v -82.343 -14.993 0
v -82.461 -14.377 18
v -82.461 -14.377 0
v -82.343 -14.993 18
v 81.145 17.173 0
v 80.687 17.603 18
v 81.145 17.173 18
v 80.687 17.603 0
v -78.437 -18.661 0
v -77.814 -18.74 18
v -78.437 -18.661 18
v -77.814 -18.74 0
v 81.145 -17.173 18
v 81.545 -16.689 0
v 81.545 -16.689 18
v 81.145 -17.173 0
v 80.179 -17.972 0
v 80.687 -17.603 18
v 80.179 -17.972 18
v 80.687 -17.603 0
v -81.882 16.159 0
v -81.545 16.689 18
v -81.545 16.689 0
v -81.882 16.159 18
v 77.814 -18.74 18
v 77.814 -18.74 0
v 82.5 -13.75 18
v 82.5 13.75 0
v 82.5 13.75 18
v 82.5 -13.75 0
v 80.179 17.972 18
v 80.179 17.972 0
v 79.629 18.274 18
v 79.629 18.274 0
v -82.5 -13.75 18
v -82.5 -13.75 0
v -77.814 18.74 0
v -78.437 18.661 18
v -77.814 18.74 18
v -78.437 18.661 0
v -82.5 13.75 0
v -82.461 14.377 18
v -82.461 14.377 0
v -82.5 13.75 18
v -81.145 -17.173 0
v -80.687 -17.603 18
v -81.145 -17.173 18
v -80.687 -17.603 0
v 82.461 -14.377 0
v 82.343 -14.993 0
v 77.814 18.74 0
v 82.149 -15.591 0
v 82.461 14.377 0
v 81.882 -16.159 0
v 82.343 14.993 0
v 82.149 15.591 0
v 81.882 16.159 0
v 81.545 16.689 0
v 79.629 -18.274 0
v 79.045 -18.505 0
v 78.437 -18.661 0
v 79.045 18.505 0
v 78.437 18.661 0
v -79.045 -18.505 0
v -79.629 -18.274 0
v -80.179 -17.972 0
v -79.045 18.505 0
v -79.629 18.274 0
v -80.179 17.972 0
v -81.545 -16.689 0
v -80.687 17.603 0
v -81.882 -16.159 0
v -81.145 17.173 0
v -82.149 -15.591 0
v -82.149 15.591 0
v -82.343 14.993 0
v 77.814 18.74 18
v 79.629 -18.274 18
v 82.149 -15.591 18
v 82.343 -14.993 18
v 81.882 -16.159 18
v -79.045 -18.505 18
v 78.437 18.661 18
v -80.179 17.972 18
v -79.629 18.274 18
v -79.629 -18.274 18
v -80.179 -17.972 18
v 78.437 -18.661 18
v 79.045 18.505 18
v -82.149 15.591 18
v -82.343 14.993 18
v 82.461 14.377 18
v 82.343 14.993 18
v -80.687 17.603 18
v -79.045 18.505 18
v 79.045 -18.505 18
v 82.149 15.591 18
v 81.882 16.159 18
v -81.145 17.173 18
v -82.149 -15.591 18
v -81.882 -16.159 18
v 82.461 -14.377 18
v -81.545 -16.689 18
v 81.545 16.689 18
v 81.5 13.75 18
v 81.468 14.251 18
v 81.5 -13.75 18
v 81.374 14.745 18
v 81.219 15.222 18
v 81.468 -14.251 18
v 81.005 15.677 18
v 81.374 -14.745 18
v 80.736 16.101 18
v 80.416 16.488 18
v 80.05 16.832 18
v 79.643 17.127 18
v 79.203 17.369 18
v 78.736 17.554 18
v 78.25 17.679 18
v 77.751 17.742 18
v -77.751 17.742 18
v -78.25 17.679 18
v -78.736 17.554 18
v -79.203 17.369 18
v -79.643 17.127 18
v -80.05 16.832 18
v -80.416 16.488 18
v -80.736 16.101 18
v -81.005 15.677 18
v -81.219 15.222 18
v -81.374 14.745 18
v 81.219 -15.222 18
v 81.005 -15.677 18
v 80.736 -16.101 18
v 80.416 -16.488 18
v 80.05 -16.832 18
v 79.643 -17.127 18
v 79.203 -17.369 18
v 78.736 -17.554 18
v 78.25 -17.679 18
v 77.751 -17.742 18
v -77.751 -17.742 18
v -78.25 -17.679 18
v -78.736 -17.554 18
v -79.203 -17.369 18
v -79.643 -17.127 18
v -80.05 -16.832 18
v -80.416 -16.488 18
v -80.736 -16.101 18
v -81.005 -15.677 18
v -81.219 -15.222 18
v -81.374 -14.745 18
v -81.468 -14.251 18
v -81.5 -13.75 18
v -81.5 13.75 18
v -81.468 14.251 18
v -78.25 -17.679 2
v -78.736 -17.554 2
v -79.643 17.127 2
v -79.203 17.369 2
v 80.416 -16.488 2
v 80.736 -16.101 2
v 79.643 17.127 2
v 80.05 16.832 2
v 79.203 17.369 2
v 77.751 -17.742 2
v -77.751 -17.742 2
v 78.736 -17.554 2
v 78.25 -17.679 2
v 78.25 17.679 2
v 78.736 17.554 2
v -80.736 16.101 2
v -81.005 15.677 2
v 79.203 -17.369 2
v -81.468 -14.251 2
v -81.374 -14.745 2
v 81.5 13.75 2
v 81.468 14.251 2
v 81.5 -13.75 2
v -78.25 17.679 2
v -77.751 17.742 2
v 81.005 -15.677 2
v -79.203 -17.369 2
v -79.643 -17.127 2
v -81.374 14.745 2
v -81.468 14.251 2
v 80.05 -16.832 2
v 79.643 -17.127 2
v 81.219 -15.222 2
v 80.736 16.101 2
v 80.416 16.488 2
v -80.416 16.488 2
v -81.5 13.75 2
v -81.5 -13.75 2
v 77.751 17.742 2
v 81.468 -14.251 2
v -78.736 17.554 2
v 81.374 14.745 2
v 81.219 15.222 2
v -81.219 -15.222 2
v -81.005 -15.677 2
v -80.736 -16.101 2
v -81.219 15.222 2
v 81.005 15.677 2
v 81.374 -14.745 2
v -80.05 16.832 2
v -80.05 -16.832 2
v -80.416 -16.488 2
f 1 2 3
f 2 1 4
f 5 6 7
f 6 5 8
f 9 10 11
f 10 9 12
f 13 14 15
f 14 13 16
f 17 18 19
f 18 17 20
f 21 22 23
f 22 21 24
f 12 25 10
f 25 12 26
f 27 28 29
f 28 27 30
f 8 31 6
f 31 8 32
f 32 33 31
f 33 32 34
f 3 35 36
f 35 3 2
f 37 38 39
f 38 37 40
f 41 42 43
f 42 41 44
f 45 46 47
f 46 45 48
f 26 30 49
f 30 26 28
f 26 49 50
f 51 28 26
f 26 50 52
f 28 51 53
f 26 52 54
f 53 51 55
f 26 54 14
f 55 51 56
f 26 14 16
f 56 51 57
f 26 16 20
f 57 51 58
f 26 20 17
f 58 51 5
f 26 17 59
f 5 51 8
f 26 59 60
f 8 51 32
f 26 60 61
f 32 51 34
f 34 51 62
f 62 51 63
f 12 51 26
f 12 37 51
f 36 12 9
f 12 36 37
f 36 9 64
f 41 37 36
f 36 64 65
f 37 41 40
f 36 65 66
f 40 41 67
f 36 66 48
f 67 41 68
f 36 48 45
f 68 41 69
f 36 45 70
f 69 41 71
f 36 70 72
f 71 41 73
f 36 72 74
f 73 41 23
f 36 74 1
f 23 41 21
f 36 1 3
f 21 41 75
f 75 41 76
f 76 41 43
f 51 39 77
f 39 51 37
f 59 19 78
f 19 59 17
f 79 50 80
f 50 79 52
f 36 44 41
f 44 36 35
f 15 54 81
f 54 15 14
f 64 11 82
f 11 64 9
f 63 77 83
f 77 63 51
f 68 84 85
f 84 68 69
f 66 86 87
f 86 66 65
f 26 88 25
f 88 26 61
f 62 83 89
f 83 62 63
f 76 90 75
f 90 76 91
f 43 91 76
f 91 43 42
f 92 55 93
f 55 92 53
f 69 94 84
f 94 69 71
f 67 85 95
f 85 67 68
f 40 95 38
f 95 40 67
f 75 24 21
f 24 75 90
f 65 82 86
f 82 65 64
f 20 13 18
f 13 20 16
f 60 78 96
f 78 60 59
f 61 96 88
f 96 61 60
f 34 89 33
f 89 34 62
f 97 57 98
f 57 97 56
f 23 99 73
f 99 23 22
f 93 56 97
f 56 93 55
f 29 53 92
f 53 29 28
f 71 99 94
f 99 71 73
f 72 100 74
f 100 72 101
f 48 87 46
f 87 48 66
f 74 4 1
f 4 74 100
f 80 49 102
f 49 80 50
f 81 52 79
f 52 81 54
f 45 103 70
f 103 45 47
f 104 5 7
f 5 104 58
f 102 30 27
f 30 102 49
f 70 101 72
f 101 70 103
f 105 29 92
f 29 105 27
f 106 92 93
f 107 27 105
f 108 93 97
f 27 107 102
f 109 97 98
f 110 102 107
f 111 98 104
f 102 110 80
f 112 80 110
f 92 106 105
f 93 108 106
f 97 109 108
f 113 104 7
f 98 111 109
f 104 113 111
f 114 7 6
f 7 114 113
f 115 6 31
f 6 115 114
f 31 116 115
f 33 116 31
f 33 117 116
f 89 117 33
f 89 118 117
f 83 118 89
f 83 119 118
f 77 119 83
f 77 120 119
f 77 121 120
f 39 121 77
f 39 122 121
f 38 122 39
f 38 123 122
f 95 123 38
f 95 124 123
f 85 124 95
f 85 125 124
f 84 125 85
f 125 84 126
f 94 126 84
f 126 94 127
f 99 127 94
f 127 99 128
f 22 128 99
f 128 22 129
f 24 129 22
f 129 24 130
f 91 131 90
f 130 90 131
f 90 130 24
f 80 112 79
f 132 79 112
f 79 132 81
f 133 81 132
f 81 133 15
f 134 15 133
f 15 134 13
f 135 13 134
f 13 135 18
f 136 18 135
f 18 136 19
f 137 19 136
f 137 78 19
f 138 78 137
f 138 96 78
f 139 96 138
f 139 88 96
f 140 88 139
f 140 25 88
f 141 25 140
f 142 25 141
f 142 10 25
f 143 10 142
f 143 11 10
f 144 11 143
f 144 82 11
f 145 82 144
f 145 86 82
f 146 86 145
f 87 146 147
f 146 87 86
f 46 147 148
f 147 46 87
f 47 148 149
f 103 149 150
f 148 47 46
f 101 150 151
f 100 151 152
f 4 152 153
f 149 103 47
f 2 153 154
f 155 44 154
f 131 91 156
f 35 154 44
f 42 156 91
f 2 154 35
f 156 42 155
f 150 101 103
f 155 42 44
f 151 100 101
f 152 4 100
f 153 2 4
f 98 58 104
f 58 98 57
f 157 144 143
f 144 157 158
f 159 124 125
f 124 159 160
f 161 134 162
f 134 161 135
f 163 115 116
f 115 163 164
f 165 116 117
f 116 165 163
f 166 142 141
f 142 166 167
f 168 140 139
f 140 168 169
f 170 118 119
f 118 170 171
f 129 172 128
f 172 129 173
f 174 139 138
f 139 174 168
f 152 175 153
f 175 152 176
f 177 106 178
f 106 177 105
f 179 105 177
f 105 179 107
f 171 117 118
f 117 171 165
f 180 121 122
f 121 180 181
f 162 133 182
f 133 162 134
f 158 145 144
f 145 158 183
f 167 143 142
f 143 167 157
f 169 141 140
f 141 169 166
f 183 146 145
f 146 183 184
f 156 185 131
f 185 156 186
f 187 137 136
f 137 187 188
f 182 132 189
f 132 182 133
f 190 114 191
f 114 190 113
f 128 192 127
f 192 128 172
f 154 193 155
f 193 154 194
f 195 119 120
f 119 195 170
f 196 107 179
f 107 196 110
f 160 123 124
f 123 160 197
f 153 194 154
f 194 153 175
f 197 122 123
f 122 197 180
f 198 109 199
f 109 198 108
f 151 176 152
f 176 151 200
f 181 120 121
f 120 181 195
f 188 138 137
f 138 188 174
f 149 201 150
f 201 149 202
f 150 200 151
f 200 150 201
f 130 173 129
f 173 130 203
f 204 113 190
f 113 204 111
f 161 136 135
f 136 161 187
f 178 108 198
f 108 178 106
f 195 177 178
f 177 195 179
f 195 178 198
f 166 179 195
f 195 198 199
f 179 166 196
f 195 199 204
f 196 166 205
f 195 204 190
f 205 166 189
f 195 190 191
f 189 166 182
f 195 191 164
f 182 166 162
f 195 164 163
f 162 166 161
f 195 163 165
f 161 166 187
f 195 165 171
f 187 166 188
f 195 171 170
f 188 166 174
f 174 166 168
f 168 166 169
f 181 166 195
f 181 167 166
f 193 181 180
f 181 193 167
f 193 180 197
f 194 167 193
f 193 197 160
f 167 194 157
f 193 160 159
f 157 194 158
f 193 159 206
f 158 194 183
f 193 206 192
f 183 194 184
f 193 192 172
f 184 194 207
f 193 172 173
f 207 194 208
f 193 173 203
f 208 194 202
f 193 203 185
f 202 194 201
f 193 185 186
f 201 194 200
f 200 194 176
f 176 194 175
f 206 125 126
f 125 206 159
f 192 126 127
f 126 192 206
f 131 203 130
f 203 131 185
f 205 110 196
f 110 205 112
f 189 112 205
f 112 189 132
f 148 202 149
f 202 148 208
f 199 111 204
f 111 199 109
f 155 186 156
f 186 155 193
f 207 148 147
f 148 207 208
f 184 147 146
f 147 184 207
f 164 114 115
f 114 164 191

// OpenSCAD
$fn = 50;


difference() {
	union() {
		hull() {
			translate(v = [-77.5000000000, 13.7500000000, 0]) {
				cylinder(h = 18, r = 5);
			}
			translate(v = [77.5000000000, 13.7500000000, 0]) {
				cylinder(h = 18, r = 5);
			}
			translate(v = [-77.5000000000, -13.7500000000, 0]) {
				cylinder(h = 18, r = 5);
			}
			translate(v = [77.5000000000, -13.7500000000, 0]) {
				cylinder(h = 18, r = 5);
			}
		}
	}
	union() {
		translate(v = [0, 0, 2]) {
			hull() {
				translate(v = [-77.5000000000, 13.7500000000, 0]) {
					cylinder(h = 16, r = 4);
				}
				translate(v = [77.5000000000, 13.7500000000, 0]) {
					cylinder(h = 16, r = 4);
				}
				translate(v = [-77.5000000000, -13.7500000000, 0]) {
					cylinder(h = 16, r = 4);
				}
				translate(v = [77.5000000000, -13.7500000000, 0]) {
					cylinder(h = 16, r = 4);
				}
			}
		}
	}
}
